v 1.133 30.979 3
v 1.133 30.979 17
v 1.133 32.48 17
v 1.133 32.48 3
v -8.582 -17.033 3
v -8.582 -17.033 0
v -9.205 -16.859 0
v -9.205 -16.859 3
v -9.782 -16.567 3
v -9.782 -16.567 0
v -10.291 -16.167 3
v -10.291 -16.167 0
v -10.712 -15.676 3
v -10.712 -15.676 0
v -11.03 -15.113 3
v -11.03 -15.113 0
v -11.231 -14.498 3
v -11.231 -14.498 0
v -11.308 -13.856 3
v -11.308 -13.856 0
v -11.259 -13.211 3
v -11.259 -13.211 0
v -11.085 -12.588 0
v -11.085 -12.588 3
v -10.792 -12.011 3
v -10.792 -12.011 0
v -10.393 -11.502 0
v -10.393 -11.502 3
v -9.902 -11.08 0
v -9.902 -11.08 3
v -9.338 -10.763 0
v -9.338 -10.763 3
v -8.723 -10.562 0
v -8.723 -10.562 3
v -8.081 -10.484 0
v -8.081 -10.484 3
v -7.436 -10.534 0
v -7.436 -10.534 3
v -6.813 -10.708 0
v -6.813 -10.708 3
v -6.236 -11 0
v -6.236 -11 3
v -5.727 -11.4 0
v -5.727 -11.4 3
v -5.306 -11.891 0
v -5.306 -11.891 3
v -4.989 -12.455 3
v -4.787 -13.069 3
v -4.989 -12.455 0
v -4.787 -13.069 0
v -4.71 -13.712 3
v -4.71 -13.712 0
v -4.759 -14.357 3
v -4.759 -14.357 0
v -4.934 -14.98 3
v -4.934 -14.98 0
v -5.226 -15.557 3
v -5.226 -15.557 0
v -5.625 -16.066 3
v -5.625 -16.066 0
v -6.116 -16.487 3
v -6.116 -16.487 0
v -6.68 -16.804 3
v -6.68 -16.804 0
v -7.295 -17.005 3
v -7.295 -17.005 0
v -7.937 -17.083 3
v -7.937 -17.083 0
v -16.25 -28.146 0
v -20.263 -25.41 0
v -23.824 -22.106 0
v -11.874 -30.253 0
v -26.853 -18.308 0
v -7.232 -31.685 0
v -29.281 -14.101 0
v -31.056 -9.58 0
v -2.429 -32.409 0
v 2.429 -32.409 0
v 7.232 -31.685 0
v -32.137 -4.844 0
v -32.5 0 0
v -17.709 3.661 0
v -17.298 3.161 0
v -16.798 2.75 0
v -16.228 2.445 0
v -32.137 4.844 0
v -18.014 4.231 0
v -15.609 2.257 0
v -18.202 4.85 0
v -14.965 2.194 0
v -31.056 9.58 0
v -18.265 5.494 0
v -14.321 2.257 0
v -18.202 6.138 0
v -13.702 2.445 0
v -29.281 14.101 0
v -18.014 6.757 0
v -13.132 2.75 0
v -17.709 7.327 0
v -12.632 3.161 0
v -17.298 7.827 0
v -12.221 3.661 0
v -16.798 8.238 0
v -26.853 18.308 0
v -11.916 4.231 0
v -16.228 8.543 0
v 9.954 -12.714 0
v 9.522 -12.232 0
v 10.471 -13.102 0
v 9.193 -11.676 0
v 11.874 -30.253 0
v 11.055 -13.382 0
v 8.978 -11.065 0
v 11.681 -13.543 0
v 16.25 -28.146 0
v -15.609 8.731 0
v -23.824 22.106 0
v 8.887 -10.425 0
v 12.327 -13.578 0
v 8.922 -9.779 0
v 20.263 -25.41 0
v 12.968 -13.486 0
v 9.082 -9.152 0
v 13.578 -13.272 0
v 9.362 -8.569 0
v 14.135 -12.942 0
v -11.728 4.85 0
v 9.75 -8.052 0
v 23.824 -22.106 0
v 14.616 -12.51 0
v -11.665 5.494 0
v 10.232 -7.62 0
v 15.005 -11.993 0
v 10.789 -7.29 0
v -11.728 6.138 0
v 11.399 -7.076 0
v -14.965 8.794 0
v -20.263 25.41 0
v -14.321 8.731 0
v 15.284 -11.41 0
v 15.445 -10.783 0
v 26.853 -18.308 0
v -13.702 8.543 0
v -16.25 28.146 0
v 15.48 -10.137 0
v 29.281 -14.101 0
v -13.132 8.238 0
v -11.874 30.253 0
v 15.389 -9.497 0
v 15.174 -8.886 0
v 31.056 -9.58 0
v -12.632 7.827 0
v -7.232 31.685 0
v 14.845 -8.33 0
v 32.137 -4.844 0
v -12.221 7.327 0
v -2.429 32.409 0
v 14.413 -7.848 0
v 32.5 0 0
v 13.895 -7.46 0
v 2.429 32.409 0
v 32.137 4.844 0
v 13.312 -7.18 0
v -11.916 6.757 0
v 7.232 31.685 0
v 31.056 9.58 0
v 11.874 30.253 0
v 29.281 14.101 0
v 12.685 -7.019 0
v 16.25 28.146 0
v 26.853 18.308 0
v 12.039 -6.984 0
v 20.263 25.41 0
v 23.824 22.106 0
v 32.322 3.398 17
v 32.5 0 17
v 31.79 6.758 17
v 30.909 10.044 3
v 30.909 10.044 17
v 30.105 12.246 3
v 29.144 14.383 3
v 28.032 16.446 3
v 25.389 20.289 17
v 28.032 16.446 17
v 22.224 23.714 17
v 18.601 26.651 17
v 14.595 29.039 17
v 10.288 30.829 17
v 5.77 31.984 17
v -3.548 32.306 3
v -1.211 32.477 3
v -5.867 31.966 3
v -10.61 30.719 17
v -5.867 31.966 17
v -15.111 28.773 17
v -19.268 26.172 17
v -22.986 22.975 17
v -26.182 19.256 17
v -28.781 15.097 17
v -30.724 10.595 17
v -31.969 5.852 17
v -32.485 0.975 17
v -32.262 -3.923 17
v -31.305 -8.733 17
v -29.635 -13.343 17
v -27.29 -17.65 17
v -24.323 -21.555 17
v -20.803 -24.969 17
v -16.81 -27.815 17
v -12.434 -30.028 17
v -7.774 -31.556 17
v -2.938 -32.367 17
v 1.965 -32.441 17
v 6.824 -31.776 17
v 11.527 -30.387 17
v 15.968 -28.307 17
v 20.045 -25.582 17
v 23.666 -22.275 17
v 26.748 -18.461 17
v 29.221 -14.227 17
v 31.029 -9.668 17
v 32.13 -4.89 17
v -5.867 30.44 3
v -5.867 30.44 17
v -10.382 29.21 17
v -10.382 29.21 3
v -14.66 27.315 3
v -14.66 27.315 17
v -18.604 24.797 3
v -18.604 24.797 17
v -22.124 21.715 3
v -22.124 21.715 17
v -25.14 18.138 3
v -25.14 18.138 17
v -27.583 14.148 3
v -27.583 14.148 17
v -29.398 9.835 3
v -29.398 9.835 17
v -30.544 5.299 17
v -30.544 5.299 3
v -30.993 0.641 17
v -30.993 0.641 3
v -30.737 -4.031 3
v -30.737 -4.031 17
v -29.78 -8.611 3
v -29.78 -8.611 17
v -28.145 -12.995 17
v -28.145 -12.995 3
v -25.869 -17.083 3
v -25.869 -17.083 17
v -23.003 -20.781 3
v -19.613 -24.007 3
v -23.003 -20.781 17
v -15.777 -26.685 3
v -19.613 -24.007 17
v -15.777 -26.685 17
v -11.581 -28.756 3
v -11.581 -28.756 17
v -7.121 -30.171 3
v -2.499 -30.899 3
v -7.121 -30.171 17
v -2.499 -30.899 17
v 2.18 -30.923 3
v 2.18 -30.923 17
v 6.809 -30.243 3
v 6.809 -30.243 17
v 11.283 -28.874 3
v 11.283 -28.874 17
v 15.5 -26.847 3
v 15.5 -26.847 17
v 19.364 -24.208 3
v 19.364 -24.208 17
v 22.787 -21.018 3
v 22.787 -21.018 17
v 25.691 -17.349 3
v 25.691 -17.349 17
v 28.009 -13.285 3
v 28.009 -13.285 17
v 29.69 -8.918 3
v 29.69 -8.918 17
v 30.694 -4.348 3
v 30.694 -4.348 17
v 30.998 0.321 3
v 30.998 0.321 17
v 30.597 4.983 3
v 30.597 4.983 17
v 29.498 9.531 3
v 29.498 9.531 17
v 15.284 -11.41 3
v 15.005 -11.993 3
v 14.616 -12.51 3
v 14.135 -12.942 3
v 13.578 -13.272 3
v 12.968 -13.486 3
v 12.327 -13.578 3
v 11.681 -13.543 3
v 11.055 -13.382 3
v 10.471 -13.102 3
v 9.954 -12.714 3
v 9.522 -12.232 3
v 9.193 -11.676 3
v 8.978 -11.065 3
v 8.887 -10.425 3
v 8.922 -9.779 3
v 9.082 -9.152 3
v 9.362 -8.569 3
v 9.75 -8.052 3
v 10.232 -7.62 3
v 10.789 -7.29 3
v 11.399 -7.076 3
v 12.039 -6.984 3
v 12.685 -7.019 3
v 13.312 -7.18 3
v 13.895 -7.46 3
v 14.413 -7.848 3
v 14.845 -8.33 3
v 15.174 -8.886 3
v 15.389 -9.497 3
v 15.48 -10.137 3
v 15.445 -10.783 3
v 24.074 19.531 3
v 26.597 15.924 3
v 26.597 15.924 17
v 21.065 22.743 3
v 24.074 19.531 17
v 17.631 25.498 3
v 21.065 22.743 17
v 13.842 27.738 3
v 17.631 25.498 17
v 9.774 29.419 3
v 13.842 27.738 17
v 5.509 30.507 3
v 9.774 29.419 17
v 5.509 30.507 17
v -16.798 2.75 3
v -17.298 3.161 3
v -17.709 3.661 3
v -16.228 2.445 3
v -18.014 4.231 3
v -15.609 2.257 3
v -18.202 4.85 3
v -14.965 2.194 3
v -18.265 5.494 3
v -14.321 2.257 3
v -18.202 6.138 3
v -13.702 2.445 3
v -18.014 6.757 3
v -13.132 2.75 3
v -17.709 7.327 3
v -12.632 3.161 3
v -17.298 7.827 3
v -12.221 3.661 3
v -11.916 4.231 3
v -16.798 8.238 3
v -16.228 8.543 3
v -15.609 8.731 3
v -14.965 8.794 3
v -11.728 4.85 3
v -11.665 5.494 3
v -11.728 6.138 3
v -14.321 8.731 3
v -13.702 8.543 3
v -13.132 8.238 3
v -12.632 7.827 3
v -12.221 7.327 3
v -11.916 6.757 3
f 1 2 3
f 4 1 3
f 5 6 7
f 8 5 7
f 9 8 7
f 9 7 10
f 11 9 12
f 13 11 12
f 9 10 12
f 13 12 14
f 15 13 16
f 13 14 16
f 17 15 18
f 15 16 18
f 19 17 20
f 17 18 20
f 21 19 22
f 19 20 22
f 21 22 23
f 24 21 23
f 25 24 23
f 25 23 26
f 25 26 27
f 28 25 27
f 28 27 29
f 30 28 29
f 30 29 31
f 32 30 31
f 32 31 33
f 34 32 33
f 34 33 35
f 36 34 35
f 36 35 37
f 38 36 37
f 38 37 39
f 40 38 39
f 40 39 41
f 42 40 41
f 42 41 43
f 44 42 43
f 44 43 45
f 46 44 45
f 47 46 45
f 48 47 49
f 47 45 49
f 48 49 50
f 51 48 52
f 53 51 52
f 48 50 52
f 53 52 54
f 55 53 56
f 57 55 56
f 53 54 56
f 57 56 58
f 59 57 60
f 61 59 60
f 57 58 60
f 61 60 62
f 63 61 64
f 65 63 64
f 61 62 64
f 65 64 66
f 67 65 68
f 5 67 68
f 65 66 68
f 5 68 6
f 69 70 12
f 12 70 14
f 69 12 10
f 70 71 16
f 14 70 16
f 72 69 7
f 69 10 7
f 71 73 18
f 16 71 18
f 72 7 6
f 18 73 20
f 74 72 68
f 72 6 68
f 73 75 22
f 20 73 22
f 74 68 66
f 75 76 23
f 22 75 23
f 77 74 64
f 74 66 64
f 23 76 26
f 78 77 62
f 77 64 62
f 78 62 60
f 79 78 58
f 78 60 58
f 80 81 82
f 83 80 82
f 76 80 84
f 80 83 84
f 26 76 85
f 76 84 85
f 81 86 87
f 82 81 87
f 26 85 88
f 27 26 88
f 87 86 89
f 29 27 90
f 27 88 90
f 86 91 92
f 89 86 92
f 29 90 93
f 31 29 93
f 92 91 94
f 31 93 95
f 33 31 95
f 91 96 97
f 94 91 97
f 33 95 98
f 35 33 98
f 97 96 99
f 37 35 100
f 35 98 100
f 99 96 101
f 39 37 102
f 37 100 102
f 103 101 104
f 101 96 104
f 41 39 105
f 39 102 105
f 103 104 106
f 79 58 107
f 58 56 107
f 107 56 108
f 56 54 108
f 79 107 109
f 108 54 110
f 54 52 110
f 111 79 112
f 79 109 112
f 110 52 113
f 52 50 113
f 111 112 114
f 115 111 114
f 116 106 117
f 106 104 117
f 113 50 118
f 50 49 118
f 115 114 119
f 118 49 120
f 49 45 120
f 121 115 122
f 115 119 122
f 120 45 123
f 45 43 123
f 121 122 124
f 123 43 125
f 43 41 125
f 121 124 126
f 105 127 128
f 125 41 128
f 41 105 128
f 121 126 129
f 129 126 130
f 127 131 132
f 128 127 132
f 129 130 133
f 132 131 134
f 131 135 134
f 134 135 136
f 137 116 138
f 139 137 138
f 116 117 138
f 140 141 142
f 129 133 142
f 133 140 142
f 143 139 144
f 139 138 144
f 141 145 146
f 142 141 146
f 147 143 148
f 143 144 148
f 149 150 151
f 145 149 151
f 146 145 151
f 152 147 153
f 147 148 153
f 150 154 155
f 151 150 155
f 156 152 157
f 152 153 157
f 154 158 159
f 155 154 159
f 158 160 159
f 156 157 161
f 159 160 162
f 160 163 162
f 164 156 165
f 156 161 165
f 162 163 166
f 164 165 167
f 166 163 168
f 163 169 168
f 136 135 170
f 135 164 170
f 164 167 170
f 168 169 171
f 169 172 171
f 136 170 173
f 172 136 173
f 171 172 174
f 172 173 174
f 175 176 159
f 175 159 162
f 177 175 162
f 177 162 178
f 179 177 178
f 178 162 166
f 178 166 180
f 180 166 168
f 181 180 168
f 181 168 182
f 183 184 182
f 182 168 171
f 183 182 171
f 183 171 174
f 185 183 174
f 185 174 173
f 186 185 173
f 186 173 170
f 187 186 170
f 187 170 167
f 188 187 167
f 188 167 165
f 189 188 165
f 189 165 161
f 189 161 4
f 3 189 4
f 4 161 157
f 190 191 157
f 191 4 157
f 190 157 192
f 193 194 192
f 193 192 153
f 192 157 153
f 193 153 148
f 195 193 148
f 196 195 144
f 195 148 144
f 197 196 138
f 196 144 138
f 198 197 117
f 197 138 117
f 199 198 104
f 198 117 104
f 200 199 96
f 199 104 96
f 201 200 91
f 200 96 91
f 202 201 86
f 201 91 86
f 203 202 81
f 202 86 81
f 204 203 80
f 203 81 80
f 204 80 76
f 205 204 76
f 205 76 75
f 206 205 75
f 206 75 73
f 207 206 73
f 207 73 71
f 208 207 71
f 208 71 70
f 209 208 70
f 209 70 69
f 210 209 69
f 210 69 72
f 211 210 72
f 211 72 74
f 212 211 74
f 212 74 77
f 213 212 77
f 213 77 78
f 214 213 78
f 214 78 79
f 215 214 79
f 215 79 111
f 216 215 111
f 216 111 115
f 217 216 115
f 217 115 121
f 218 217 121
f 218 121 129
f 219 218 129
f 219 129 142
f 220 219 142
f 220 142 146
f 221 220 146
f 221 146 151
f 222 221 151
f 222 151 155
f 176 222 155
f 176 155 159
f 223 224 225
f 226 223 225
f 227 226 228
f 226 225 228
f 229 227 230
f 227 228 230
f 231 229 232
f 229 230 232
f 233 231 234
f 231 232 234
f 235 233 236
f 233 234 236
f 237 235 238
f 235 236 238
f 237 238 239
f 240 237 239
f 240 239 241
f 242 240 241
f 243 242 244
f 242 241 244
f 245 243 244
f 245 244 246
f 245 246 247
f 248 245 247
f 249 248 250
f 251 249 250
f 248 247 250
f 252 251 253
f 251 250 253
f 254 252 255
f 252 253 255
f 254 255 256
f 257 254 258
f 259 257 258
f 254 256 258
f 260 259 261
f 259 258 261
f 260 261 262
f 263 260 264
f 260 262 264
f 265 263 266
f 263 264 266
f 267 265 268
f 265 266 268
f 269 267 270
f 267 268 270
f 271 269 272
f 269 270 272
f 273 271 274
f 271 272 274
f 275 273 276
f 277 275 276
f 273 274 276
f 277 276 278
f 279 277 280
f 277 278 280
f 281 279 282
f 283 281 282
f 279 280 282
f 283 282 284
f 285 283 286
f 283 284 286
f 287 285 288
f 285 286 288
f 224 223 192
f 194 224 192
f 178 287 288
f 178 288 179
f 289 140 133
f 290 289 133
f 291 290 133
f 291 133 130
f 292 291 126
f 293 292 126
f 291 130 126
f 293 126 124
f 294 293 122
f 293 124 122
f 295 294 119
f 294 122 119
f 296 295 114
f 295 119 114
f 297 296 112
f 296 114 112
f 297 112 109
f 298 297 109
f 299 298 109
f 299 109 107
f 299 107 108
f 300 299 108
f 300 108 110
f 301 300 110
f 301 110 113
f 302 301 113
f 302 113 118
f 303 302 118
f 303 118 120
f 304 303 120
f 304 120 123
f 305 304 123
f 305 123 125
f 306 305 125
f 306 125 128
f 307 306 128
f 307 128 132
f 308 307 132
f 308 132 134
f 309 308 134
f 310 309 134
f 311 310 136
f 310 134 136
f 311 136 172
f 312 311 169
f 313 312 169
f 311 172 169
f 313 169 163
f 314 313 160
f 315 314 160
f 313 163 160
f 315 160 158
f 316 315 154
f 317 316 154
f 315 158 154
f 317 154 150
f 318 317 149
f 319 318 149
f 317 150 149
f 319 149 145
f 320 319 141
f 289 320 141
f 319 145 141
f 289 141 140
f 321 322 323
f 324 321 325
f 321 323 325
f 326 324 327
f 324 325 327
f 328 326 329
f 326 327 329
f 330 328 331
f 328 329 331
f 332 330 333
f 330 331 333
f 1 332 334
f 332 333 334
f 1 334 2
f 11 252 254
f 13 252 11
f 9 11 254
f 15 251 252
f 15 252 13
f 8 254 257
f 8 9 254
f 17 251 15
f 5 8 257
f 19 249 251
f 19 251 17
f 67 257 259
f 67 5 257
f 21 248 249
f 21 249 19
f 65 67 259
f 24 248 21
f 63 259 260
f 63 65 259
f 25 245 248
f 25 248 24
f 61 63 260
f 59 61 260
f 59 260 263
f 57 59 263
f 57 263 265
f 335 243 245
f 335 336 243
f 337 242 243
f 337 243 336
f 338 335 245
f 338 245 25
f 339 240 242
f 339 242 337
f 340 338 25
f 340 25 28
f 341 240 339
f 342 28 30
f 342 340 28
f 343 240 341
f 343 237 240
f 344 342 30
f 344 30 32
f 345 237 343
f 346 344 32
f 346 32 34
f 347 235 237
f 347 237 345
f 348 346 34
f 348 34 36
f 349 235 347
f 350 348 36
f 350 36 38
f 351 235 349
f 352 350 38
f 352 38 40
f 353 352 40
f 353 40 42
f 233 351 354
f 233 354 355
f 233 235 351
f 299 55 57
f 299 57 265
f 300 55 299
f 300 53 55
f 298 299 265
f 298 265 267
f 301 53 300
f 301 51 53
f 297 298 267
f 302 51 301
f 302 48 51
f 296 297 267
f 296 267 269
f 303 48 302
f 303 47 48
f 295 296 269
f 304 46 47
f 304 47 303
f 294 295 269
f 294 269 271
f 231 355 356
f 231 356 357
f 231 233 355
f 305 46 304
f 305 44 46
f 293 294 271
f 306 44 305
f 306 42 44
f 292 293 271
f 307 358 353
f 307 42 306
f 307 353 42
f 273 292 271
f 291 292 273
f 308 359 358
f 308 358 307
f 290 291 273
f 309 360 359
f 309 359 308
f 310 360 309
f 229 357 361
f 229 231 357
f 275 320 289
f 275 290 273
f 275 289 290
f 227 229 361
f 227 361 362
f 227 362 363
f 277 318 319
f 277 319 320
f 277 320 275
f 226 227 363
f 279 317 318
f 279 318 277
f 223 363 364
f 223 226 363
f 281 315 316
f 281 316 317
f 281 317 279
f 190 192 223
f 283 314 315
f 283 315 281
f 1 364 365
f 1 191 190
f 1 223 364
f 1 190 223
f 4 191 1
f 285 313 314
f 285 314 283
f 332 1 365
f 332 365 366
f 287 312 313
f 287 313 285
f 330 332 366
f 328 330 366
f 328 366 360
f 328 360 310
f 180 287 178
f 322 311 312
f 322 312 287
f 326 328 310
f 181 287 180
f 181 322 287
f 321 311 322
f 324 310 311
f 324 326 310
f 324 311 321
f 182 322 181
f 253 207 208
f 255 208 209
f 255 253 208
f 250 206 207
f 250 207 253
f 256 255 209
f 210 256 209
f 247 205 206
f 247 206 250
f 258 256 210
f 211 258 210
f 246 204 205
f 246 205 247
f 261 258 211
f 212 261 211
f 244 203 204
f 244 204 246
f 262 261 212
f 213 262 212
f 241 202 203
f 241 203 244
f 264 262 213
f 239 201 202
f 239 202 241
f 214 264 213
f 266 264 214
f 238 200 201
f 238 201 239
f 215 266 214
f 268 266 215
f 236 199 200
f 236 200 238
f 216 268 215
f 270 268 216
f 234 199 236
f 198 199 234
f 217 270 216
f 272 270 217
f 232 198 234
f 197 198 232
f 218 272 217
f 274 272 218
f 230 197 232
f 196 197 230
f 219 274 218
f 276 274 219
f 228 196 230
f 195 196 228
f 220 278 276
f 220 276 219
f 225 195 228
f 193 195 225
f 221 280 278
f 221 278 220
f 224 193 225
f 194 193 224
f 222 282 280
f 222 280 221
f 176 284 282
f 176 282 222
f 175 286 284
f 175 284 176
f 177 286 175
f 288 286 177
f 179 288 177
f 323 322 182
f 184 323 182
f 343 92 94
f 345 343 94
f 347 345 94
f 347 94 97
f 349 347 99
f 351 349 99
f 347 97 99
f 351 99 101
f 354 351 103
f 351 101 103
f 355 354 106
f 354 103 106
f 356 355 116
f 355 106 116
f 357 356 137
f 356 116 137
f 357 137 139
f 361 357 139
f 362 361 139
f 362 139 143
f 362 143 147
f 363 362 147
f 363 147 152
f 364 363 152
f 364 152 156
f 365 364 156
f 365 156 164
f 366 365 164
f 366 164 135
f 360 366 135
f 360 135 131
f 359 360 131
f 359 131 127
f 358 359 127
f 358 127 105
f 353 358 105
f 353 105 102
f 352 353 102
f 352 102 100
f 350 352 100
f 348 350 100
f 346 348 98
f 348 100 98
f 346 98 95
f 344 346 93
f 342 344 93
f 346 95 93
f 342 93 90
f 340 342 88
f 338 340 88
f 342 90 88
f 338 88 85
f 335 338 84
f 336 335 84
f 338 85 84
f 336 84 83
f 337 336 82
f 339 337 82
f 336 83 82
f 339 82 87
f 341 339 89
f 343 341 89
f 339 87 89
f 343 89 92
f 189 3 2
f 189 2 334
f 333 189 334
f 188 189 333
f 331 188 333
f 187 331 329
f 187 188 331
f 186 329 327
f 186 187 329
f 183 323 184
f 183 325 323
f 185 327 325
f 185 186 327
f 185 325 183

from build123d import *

# Parameters (mm, degrees)
ESQUISSE1_R                  = 32.5
BOSS_EXTRU_1_DEPTH           = 17
ESQUISSE2_R                  = 31
ENL_V_MAT_EXTRU_1_DEPTH      = 14
ESQUISSE3_W                  = 7
ESQUISSE3_H                  = 21.006684507
ENL_V_MAT_EXTRU_2_DEPTH      = 14
R_P_TITION_CIRCULAIRE1_COUNT = 2
R_P_TITION_CIRCULAIRE1_ANGLE = 70
D_GAGEMENT_M61_D             = 6.6
R_P_TITION_CIRCULAIRE2_COUNT = 3
R_P_TITION_CIRCULAIRE2_ANGLE = 160


with BuildPart() as part:
    # Esquisse1 → Boss.-Extru.1 (new body)
    with BuildSketch(Plane.XY):
        Circle(ESQUISSE1_R)
    extrude(amount=BOSS_EXTRU_1_DEPTH)

    # Esquisse2 → Enlèv. mat.-Extru.1 (cut)
    with BuildSketch(Plane.XY.offset(17)):
        Circle(ESQUISSE2_R)
    extrude(amount=-ENL_V_MAT_EXTRU_1_DEPTH, mode=Mode.SUBTRACT)

    # Esquisse3 → Enlèv. mat.-Extru.2 (cut)
    with BuildSketch(Plane.XY.offset(17)):
        with Locations((-2.367072337, 31.778784947)):
            Rectangle(ESQUISSE3_W, ESQUISSE3_H)
    enl_v_mat_extru_2 = extrude(amount=-ENL_V_MAT_EXTRU_2_DEPTH, mode=Mode.SUBTRACT)

    # Répétition circulaire1: Enlèv. mat.-Extru.2 ×2 about axis
    r_p_tition_circulaire1_axis = Axis((0, 0, 17), (0, 0, -1))
    for i in range(1, R_P_TITION_CIRCULAIRE1_COUNT):
        add(enl_v_mat_extru_2.rotate(r_p_tition_circulaire1_axis, i * R_P_TITION_CIRCULAIRE1_ANGLE / (R_P_TITION_CIRCULAIRE1_COUNT - 1)), mode=Mode.SUBTRACT)

    # Dégagement M61 (through all)
    with Locations(Plane.XY.offset(3)):
        with Locations((-14.965006824, 5.494015269)):
            d_gagement_m61 = Hole(D_GAGEMENT_M61_D / 2)

    # Répétition circulaire2: Dégagement M61 ×3 about axis
    r_p_tition_circulaire2_axis = Axis((0, 0, 0), (0, 0, 1))
    for i in range(1, R_P_TITION_CIRCULAIRE2_COUNT):
        add(d_gagement_m61.rotate(r_p_tition_circulaire2_axis, i * R_P_TITION_CIRCULAIRE2_ANGLE / (R_P_TITION_CIRCULAIRE2_COUNT - 1)), mode=Mode.SUBTRACT)


solid = part.part
